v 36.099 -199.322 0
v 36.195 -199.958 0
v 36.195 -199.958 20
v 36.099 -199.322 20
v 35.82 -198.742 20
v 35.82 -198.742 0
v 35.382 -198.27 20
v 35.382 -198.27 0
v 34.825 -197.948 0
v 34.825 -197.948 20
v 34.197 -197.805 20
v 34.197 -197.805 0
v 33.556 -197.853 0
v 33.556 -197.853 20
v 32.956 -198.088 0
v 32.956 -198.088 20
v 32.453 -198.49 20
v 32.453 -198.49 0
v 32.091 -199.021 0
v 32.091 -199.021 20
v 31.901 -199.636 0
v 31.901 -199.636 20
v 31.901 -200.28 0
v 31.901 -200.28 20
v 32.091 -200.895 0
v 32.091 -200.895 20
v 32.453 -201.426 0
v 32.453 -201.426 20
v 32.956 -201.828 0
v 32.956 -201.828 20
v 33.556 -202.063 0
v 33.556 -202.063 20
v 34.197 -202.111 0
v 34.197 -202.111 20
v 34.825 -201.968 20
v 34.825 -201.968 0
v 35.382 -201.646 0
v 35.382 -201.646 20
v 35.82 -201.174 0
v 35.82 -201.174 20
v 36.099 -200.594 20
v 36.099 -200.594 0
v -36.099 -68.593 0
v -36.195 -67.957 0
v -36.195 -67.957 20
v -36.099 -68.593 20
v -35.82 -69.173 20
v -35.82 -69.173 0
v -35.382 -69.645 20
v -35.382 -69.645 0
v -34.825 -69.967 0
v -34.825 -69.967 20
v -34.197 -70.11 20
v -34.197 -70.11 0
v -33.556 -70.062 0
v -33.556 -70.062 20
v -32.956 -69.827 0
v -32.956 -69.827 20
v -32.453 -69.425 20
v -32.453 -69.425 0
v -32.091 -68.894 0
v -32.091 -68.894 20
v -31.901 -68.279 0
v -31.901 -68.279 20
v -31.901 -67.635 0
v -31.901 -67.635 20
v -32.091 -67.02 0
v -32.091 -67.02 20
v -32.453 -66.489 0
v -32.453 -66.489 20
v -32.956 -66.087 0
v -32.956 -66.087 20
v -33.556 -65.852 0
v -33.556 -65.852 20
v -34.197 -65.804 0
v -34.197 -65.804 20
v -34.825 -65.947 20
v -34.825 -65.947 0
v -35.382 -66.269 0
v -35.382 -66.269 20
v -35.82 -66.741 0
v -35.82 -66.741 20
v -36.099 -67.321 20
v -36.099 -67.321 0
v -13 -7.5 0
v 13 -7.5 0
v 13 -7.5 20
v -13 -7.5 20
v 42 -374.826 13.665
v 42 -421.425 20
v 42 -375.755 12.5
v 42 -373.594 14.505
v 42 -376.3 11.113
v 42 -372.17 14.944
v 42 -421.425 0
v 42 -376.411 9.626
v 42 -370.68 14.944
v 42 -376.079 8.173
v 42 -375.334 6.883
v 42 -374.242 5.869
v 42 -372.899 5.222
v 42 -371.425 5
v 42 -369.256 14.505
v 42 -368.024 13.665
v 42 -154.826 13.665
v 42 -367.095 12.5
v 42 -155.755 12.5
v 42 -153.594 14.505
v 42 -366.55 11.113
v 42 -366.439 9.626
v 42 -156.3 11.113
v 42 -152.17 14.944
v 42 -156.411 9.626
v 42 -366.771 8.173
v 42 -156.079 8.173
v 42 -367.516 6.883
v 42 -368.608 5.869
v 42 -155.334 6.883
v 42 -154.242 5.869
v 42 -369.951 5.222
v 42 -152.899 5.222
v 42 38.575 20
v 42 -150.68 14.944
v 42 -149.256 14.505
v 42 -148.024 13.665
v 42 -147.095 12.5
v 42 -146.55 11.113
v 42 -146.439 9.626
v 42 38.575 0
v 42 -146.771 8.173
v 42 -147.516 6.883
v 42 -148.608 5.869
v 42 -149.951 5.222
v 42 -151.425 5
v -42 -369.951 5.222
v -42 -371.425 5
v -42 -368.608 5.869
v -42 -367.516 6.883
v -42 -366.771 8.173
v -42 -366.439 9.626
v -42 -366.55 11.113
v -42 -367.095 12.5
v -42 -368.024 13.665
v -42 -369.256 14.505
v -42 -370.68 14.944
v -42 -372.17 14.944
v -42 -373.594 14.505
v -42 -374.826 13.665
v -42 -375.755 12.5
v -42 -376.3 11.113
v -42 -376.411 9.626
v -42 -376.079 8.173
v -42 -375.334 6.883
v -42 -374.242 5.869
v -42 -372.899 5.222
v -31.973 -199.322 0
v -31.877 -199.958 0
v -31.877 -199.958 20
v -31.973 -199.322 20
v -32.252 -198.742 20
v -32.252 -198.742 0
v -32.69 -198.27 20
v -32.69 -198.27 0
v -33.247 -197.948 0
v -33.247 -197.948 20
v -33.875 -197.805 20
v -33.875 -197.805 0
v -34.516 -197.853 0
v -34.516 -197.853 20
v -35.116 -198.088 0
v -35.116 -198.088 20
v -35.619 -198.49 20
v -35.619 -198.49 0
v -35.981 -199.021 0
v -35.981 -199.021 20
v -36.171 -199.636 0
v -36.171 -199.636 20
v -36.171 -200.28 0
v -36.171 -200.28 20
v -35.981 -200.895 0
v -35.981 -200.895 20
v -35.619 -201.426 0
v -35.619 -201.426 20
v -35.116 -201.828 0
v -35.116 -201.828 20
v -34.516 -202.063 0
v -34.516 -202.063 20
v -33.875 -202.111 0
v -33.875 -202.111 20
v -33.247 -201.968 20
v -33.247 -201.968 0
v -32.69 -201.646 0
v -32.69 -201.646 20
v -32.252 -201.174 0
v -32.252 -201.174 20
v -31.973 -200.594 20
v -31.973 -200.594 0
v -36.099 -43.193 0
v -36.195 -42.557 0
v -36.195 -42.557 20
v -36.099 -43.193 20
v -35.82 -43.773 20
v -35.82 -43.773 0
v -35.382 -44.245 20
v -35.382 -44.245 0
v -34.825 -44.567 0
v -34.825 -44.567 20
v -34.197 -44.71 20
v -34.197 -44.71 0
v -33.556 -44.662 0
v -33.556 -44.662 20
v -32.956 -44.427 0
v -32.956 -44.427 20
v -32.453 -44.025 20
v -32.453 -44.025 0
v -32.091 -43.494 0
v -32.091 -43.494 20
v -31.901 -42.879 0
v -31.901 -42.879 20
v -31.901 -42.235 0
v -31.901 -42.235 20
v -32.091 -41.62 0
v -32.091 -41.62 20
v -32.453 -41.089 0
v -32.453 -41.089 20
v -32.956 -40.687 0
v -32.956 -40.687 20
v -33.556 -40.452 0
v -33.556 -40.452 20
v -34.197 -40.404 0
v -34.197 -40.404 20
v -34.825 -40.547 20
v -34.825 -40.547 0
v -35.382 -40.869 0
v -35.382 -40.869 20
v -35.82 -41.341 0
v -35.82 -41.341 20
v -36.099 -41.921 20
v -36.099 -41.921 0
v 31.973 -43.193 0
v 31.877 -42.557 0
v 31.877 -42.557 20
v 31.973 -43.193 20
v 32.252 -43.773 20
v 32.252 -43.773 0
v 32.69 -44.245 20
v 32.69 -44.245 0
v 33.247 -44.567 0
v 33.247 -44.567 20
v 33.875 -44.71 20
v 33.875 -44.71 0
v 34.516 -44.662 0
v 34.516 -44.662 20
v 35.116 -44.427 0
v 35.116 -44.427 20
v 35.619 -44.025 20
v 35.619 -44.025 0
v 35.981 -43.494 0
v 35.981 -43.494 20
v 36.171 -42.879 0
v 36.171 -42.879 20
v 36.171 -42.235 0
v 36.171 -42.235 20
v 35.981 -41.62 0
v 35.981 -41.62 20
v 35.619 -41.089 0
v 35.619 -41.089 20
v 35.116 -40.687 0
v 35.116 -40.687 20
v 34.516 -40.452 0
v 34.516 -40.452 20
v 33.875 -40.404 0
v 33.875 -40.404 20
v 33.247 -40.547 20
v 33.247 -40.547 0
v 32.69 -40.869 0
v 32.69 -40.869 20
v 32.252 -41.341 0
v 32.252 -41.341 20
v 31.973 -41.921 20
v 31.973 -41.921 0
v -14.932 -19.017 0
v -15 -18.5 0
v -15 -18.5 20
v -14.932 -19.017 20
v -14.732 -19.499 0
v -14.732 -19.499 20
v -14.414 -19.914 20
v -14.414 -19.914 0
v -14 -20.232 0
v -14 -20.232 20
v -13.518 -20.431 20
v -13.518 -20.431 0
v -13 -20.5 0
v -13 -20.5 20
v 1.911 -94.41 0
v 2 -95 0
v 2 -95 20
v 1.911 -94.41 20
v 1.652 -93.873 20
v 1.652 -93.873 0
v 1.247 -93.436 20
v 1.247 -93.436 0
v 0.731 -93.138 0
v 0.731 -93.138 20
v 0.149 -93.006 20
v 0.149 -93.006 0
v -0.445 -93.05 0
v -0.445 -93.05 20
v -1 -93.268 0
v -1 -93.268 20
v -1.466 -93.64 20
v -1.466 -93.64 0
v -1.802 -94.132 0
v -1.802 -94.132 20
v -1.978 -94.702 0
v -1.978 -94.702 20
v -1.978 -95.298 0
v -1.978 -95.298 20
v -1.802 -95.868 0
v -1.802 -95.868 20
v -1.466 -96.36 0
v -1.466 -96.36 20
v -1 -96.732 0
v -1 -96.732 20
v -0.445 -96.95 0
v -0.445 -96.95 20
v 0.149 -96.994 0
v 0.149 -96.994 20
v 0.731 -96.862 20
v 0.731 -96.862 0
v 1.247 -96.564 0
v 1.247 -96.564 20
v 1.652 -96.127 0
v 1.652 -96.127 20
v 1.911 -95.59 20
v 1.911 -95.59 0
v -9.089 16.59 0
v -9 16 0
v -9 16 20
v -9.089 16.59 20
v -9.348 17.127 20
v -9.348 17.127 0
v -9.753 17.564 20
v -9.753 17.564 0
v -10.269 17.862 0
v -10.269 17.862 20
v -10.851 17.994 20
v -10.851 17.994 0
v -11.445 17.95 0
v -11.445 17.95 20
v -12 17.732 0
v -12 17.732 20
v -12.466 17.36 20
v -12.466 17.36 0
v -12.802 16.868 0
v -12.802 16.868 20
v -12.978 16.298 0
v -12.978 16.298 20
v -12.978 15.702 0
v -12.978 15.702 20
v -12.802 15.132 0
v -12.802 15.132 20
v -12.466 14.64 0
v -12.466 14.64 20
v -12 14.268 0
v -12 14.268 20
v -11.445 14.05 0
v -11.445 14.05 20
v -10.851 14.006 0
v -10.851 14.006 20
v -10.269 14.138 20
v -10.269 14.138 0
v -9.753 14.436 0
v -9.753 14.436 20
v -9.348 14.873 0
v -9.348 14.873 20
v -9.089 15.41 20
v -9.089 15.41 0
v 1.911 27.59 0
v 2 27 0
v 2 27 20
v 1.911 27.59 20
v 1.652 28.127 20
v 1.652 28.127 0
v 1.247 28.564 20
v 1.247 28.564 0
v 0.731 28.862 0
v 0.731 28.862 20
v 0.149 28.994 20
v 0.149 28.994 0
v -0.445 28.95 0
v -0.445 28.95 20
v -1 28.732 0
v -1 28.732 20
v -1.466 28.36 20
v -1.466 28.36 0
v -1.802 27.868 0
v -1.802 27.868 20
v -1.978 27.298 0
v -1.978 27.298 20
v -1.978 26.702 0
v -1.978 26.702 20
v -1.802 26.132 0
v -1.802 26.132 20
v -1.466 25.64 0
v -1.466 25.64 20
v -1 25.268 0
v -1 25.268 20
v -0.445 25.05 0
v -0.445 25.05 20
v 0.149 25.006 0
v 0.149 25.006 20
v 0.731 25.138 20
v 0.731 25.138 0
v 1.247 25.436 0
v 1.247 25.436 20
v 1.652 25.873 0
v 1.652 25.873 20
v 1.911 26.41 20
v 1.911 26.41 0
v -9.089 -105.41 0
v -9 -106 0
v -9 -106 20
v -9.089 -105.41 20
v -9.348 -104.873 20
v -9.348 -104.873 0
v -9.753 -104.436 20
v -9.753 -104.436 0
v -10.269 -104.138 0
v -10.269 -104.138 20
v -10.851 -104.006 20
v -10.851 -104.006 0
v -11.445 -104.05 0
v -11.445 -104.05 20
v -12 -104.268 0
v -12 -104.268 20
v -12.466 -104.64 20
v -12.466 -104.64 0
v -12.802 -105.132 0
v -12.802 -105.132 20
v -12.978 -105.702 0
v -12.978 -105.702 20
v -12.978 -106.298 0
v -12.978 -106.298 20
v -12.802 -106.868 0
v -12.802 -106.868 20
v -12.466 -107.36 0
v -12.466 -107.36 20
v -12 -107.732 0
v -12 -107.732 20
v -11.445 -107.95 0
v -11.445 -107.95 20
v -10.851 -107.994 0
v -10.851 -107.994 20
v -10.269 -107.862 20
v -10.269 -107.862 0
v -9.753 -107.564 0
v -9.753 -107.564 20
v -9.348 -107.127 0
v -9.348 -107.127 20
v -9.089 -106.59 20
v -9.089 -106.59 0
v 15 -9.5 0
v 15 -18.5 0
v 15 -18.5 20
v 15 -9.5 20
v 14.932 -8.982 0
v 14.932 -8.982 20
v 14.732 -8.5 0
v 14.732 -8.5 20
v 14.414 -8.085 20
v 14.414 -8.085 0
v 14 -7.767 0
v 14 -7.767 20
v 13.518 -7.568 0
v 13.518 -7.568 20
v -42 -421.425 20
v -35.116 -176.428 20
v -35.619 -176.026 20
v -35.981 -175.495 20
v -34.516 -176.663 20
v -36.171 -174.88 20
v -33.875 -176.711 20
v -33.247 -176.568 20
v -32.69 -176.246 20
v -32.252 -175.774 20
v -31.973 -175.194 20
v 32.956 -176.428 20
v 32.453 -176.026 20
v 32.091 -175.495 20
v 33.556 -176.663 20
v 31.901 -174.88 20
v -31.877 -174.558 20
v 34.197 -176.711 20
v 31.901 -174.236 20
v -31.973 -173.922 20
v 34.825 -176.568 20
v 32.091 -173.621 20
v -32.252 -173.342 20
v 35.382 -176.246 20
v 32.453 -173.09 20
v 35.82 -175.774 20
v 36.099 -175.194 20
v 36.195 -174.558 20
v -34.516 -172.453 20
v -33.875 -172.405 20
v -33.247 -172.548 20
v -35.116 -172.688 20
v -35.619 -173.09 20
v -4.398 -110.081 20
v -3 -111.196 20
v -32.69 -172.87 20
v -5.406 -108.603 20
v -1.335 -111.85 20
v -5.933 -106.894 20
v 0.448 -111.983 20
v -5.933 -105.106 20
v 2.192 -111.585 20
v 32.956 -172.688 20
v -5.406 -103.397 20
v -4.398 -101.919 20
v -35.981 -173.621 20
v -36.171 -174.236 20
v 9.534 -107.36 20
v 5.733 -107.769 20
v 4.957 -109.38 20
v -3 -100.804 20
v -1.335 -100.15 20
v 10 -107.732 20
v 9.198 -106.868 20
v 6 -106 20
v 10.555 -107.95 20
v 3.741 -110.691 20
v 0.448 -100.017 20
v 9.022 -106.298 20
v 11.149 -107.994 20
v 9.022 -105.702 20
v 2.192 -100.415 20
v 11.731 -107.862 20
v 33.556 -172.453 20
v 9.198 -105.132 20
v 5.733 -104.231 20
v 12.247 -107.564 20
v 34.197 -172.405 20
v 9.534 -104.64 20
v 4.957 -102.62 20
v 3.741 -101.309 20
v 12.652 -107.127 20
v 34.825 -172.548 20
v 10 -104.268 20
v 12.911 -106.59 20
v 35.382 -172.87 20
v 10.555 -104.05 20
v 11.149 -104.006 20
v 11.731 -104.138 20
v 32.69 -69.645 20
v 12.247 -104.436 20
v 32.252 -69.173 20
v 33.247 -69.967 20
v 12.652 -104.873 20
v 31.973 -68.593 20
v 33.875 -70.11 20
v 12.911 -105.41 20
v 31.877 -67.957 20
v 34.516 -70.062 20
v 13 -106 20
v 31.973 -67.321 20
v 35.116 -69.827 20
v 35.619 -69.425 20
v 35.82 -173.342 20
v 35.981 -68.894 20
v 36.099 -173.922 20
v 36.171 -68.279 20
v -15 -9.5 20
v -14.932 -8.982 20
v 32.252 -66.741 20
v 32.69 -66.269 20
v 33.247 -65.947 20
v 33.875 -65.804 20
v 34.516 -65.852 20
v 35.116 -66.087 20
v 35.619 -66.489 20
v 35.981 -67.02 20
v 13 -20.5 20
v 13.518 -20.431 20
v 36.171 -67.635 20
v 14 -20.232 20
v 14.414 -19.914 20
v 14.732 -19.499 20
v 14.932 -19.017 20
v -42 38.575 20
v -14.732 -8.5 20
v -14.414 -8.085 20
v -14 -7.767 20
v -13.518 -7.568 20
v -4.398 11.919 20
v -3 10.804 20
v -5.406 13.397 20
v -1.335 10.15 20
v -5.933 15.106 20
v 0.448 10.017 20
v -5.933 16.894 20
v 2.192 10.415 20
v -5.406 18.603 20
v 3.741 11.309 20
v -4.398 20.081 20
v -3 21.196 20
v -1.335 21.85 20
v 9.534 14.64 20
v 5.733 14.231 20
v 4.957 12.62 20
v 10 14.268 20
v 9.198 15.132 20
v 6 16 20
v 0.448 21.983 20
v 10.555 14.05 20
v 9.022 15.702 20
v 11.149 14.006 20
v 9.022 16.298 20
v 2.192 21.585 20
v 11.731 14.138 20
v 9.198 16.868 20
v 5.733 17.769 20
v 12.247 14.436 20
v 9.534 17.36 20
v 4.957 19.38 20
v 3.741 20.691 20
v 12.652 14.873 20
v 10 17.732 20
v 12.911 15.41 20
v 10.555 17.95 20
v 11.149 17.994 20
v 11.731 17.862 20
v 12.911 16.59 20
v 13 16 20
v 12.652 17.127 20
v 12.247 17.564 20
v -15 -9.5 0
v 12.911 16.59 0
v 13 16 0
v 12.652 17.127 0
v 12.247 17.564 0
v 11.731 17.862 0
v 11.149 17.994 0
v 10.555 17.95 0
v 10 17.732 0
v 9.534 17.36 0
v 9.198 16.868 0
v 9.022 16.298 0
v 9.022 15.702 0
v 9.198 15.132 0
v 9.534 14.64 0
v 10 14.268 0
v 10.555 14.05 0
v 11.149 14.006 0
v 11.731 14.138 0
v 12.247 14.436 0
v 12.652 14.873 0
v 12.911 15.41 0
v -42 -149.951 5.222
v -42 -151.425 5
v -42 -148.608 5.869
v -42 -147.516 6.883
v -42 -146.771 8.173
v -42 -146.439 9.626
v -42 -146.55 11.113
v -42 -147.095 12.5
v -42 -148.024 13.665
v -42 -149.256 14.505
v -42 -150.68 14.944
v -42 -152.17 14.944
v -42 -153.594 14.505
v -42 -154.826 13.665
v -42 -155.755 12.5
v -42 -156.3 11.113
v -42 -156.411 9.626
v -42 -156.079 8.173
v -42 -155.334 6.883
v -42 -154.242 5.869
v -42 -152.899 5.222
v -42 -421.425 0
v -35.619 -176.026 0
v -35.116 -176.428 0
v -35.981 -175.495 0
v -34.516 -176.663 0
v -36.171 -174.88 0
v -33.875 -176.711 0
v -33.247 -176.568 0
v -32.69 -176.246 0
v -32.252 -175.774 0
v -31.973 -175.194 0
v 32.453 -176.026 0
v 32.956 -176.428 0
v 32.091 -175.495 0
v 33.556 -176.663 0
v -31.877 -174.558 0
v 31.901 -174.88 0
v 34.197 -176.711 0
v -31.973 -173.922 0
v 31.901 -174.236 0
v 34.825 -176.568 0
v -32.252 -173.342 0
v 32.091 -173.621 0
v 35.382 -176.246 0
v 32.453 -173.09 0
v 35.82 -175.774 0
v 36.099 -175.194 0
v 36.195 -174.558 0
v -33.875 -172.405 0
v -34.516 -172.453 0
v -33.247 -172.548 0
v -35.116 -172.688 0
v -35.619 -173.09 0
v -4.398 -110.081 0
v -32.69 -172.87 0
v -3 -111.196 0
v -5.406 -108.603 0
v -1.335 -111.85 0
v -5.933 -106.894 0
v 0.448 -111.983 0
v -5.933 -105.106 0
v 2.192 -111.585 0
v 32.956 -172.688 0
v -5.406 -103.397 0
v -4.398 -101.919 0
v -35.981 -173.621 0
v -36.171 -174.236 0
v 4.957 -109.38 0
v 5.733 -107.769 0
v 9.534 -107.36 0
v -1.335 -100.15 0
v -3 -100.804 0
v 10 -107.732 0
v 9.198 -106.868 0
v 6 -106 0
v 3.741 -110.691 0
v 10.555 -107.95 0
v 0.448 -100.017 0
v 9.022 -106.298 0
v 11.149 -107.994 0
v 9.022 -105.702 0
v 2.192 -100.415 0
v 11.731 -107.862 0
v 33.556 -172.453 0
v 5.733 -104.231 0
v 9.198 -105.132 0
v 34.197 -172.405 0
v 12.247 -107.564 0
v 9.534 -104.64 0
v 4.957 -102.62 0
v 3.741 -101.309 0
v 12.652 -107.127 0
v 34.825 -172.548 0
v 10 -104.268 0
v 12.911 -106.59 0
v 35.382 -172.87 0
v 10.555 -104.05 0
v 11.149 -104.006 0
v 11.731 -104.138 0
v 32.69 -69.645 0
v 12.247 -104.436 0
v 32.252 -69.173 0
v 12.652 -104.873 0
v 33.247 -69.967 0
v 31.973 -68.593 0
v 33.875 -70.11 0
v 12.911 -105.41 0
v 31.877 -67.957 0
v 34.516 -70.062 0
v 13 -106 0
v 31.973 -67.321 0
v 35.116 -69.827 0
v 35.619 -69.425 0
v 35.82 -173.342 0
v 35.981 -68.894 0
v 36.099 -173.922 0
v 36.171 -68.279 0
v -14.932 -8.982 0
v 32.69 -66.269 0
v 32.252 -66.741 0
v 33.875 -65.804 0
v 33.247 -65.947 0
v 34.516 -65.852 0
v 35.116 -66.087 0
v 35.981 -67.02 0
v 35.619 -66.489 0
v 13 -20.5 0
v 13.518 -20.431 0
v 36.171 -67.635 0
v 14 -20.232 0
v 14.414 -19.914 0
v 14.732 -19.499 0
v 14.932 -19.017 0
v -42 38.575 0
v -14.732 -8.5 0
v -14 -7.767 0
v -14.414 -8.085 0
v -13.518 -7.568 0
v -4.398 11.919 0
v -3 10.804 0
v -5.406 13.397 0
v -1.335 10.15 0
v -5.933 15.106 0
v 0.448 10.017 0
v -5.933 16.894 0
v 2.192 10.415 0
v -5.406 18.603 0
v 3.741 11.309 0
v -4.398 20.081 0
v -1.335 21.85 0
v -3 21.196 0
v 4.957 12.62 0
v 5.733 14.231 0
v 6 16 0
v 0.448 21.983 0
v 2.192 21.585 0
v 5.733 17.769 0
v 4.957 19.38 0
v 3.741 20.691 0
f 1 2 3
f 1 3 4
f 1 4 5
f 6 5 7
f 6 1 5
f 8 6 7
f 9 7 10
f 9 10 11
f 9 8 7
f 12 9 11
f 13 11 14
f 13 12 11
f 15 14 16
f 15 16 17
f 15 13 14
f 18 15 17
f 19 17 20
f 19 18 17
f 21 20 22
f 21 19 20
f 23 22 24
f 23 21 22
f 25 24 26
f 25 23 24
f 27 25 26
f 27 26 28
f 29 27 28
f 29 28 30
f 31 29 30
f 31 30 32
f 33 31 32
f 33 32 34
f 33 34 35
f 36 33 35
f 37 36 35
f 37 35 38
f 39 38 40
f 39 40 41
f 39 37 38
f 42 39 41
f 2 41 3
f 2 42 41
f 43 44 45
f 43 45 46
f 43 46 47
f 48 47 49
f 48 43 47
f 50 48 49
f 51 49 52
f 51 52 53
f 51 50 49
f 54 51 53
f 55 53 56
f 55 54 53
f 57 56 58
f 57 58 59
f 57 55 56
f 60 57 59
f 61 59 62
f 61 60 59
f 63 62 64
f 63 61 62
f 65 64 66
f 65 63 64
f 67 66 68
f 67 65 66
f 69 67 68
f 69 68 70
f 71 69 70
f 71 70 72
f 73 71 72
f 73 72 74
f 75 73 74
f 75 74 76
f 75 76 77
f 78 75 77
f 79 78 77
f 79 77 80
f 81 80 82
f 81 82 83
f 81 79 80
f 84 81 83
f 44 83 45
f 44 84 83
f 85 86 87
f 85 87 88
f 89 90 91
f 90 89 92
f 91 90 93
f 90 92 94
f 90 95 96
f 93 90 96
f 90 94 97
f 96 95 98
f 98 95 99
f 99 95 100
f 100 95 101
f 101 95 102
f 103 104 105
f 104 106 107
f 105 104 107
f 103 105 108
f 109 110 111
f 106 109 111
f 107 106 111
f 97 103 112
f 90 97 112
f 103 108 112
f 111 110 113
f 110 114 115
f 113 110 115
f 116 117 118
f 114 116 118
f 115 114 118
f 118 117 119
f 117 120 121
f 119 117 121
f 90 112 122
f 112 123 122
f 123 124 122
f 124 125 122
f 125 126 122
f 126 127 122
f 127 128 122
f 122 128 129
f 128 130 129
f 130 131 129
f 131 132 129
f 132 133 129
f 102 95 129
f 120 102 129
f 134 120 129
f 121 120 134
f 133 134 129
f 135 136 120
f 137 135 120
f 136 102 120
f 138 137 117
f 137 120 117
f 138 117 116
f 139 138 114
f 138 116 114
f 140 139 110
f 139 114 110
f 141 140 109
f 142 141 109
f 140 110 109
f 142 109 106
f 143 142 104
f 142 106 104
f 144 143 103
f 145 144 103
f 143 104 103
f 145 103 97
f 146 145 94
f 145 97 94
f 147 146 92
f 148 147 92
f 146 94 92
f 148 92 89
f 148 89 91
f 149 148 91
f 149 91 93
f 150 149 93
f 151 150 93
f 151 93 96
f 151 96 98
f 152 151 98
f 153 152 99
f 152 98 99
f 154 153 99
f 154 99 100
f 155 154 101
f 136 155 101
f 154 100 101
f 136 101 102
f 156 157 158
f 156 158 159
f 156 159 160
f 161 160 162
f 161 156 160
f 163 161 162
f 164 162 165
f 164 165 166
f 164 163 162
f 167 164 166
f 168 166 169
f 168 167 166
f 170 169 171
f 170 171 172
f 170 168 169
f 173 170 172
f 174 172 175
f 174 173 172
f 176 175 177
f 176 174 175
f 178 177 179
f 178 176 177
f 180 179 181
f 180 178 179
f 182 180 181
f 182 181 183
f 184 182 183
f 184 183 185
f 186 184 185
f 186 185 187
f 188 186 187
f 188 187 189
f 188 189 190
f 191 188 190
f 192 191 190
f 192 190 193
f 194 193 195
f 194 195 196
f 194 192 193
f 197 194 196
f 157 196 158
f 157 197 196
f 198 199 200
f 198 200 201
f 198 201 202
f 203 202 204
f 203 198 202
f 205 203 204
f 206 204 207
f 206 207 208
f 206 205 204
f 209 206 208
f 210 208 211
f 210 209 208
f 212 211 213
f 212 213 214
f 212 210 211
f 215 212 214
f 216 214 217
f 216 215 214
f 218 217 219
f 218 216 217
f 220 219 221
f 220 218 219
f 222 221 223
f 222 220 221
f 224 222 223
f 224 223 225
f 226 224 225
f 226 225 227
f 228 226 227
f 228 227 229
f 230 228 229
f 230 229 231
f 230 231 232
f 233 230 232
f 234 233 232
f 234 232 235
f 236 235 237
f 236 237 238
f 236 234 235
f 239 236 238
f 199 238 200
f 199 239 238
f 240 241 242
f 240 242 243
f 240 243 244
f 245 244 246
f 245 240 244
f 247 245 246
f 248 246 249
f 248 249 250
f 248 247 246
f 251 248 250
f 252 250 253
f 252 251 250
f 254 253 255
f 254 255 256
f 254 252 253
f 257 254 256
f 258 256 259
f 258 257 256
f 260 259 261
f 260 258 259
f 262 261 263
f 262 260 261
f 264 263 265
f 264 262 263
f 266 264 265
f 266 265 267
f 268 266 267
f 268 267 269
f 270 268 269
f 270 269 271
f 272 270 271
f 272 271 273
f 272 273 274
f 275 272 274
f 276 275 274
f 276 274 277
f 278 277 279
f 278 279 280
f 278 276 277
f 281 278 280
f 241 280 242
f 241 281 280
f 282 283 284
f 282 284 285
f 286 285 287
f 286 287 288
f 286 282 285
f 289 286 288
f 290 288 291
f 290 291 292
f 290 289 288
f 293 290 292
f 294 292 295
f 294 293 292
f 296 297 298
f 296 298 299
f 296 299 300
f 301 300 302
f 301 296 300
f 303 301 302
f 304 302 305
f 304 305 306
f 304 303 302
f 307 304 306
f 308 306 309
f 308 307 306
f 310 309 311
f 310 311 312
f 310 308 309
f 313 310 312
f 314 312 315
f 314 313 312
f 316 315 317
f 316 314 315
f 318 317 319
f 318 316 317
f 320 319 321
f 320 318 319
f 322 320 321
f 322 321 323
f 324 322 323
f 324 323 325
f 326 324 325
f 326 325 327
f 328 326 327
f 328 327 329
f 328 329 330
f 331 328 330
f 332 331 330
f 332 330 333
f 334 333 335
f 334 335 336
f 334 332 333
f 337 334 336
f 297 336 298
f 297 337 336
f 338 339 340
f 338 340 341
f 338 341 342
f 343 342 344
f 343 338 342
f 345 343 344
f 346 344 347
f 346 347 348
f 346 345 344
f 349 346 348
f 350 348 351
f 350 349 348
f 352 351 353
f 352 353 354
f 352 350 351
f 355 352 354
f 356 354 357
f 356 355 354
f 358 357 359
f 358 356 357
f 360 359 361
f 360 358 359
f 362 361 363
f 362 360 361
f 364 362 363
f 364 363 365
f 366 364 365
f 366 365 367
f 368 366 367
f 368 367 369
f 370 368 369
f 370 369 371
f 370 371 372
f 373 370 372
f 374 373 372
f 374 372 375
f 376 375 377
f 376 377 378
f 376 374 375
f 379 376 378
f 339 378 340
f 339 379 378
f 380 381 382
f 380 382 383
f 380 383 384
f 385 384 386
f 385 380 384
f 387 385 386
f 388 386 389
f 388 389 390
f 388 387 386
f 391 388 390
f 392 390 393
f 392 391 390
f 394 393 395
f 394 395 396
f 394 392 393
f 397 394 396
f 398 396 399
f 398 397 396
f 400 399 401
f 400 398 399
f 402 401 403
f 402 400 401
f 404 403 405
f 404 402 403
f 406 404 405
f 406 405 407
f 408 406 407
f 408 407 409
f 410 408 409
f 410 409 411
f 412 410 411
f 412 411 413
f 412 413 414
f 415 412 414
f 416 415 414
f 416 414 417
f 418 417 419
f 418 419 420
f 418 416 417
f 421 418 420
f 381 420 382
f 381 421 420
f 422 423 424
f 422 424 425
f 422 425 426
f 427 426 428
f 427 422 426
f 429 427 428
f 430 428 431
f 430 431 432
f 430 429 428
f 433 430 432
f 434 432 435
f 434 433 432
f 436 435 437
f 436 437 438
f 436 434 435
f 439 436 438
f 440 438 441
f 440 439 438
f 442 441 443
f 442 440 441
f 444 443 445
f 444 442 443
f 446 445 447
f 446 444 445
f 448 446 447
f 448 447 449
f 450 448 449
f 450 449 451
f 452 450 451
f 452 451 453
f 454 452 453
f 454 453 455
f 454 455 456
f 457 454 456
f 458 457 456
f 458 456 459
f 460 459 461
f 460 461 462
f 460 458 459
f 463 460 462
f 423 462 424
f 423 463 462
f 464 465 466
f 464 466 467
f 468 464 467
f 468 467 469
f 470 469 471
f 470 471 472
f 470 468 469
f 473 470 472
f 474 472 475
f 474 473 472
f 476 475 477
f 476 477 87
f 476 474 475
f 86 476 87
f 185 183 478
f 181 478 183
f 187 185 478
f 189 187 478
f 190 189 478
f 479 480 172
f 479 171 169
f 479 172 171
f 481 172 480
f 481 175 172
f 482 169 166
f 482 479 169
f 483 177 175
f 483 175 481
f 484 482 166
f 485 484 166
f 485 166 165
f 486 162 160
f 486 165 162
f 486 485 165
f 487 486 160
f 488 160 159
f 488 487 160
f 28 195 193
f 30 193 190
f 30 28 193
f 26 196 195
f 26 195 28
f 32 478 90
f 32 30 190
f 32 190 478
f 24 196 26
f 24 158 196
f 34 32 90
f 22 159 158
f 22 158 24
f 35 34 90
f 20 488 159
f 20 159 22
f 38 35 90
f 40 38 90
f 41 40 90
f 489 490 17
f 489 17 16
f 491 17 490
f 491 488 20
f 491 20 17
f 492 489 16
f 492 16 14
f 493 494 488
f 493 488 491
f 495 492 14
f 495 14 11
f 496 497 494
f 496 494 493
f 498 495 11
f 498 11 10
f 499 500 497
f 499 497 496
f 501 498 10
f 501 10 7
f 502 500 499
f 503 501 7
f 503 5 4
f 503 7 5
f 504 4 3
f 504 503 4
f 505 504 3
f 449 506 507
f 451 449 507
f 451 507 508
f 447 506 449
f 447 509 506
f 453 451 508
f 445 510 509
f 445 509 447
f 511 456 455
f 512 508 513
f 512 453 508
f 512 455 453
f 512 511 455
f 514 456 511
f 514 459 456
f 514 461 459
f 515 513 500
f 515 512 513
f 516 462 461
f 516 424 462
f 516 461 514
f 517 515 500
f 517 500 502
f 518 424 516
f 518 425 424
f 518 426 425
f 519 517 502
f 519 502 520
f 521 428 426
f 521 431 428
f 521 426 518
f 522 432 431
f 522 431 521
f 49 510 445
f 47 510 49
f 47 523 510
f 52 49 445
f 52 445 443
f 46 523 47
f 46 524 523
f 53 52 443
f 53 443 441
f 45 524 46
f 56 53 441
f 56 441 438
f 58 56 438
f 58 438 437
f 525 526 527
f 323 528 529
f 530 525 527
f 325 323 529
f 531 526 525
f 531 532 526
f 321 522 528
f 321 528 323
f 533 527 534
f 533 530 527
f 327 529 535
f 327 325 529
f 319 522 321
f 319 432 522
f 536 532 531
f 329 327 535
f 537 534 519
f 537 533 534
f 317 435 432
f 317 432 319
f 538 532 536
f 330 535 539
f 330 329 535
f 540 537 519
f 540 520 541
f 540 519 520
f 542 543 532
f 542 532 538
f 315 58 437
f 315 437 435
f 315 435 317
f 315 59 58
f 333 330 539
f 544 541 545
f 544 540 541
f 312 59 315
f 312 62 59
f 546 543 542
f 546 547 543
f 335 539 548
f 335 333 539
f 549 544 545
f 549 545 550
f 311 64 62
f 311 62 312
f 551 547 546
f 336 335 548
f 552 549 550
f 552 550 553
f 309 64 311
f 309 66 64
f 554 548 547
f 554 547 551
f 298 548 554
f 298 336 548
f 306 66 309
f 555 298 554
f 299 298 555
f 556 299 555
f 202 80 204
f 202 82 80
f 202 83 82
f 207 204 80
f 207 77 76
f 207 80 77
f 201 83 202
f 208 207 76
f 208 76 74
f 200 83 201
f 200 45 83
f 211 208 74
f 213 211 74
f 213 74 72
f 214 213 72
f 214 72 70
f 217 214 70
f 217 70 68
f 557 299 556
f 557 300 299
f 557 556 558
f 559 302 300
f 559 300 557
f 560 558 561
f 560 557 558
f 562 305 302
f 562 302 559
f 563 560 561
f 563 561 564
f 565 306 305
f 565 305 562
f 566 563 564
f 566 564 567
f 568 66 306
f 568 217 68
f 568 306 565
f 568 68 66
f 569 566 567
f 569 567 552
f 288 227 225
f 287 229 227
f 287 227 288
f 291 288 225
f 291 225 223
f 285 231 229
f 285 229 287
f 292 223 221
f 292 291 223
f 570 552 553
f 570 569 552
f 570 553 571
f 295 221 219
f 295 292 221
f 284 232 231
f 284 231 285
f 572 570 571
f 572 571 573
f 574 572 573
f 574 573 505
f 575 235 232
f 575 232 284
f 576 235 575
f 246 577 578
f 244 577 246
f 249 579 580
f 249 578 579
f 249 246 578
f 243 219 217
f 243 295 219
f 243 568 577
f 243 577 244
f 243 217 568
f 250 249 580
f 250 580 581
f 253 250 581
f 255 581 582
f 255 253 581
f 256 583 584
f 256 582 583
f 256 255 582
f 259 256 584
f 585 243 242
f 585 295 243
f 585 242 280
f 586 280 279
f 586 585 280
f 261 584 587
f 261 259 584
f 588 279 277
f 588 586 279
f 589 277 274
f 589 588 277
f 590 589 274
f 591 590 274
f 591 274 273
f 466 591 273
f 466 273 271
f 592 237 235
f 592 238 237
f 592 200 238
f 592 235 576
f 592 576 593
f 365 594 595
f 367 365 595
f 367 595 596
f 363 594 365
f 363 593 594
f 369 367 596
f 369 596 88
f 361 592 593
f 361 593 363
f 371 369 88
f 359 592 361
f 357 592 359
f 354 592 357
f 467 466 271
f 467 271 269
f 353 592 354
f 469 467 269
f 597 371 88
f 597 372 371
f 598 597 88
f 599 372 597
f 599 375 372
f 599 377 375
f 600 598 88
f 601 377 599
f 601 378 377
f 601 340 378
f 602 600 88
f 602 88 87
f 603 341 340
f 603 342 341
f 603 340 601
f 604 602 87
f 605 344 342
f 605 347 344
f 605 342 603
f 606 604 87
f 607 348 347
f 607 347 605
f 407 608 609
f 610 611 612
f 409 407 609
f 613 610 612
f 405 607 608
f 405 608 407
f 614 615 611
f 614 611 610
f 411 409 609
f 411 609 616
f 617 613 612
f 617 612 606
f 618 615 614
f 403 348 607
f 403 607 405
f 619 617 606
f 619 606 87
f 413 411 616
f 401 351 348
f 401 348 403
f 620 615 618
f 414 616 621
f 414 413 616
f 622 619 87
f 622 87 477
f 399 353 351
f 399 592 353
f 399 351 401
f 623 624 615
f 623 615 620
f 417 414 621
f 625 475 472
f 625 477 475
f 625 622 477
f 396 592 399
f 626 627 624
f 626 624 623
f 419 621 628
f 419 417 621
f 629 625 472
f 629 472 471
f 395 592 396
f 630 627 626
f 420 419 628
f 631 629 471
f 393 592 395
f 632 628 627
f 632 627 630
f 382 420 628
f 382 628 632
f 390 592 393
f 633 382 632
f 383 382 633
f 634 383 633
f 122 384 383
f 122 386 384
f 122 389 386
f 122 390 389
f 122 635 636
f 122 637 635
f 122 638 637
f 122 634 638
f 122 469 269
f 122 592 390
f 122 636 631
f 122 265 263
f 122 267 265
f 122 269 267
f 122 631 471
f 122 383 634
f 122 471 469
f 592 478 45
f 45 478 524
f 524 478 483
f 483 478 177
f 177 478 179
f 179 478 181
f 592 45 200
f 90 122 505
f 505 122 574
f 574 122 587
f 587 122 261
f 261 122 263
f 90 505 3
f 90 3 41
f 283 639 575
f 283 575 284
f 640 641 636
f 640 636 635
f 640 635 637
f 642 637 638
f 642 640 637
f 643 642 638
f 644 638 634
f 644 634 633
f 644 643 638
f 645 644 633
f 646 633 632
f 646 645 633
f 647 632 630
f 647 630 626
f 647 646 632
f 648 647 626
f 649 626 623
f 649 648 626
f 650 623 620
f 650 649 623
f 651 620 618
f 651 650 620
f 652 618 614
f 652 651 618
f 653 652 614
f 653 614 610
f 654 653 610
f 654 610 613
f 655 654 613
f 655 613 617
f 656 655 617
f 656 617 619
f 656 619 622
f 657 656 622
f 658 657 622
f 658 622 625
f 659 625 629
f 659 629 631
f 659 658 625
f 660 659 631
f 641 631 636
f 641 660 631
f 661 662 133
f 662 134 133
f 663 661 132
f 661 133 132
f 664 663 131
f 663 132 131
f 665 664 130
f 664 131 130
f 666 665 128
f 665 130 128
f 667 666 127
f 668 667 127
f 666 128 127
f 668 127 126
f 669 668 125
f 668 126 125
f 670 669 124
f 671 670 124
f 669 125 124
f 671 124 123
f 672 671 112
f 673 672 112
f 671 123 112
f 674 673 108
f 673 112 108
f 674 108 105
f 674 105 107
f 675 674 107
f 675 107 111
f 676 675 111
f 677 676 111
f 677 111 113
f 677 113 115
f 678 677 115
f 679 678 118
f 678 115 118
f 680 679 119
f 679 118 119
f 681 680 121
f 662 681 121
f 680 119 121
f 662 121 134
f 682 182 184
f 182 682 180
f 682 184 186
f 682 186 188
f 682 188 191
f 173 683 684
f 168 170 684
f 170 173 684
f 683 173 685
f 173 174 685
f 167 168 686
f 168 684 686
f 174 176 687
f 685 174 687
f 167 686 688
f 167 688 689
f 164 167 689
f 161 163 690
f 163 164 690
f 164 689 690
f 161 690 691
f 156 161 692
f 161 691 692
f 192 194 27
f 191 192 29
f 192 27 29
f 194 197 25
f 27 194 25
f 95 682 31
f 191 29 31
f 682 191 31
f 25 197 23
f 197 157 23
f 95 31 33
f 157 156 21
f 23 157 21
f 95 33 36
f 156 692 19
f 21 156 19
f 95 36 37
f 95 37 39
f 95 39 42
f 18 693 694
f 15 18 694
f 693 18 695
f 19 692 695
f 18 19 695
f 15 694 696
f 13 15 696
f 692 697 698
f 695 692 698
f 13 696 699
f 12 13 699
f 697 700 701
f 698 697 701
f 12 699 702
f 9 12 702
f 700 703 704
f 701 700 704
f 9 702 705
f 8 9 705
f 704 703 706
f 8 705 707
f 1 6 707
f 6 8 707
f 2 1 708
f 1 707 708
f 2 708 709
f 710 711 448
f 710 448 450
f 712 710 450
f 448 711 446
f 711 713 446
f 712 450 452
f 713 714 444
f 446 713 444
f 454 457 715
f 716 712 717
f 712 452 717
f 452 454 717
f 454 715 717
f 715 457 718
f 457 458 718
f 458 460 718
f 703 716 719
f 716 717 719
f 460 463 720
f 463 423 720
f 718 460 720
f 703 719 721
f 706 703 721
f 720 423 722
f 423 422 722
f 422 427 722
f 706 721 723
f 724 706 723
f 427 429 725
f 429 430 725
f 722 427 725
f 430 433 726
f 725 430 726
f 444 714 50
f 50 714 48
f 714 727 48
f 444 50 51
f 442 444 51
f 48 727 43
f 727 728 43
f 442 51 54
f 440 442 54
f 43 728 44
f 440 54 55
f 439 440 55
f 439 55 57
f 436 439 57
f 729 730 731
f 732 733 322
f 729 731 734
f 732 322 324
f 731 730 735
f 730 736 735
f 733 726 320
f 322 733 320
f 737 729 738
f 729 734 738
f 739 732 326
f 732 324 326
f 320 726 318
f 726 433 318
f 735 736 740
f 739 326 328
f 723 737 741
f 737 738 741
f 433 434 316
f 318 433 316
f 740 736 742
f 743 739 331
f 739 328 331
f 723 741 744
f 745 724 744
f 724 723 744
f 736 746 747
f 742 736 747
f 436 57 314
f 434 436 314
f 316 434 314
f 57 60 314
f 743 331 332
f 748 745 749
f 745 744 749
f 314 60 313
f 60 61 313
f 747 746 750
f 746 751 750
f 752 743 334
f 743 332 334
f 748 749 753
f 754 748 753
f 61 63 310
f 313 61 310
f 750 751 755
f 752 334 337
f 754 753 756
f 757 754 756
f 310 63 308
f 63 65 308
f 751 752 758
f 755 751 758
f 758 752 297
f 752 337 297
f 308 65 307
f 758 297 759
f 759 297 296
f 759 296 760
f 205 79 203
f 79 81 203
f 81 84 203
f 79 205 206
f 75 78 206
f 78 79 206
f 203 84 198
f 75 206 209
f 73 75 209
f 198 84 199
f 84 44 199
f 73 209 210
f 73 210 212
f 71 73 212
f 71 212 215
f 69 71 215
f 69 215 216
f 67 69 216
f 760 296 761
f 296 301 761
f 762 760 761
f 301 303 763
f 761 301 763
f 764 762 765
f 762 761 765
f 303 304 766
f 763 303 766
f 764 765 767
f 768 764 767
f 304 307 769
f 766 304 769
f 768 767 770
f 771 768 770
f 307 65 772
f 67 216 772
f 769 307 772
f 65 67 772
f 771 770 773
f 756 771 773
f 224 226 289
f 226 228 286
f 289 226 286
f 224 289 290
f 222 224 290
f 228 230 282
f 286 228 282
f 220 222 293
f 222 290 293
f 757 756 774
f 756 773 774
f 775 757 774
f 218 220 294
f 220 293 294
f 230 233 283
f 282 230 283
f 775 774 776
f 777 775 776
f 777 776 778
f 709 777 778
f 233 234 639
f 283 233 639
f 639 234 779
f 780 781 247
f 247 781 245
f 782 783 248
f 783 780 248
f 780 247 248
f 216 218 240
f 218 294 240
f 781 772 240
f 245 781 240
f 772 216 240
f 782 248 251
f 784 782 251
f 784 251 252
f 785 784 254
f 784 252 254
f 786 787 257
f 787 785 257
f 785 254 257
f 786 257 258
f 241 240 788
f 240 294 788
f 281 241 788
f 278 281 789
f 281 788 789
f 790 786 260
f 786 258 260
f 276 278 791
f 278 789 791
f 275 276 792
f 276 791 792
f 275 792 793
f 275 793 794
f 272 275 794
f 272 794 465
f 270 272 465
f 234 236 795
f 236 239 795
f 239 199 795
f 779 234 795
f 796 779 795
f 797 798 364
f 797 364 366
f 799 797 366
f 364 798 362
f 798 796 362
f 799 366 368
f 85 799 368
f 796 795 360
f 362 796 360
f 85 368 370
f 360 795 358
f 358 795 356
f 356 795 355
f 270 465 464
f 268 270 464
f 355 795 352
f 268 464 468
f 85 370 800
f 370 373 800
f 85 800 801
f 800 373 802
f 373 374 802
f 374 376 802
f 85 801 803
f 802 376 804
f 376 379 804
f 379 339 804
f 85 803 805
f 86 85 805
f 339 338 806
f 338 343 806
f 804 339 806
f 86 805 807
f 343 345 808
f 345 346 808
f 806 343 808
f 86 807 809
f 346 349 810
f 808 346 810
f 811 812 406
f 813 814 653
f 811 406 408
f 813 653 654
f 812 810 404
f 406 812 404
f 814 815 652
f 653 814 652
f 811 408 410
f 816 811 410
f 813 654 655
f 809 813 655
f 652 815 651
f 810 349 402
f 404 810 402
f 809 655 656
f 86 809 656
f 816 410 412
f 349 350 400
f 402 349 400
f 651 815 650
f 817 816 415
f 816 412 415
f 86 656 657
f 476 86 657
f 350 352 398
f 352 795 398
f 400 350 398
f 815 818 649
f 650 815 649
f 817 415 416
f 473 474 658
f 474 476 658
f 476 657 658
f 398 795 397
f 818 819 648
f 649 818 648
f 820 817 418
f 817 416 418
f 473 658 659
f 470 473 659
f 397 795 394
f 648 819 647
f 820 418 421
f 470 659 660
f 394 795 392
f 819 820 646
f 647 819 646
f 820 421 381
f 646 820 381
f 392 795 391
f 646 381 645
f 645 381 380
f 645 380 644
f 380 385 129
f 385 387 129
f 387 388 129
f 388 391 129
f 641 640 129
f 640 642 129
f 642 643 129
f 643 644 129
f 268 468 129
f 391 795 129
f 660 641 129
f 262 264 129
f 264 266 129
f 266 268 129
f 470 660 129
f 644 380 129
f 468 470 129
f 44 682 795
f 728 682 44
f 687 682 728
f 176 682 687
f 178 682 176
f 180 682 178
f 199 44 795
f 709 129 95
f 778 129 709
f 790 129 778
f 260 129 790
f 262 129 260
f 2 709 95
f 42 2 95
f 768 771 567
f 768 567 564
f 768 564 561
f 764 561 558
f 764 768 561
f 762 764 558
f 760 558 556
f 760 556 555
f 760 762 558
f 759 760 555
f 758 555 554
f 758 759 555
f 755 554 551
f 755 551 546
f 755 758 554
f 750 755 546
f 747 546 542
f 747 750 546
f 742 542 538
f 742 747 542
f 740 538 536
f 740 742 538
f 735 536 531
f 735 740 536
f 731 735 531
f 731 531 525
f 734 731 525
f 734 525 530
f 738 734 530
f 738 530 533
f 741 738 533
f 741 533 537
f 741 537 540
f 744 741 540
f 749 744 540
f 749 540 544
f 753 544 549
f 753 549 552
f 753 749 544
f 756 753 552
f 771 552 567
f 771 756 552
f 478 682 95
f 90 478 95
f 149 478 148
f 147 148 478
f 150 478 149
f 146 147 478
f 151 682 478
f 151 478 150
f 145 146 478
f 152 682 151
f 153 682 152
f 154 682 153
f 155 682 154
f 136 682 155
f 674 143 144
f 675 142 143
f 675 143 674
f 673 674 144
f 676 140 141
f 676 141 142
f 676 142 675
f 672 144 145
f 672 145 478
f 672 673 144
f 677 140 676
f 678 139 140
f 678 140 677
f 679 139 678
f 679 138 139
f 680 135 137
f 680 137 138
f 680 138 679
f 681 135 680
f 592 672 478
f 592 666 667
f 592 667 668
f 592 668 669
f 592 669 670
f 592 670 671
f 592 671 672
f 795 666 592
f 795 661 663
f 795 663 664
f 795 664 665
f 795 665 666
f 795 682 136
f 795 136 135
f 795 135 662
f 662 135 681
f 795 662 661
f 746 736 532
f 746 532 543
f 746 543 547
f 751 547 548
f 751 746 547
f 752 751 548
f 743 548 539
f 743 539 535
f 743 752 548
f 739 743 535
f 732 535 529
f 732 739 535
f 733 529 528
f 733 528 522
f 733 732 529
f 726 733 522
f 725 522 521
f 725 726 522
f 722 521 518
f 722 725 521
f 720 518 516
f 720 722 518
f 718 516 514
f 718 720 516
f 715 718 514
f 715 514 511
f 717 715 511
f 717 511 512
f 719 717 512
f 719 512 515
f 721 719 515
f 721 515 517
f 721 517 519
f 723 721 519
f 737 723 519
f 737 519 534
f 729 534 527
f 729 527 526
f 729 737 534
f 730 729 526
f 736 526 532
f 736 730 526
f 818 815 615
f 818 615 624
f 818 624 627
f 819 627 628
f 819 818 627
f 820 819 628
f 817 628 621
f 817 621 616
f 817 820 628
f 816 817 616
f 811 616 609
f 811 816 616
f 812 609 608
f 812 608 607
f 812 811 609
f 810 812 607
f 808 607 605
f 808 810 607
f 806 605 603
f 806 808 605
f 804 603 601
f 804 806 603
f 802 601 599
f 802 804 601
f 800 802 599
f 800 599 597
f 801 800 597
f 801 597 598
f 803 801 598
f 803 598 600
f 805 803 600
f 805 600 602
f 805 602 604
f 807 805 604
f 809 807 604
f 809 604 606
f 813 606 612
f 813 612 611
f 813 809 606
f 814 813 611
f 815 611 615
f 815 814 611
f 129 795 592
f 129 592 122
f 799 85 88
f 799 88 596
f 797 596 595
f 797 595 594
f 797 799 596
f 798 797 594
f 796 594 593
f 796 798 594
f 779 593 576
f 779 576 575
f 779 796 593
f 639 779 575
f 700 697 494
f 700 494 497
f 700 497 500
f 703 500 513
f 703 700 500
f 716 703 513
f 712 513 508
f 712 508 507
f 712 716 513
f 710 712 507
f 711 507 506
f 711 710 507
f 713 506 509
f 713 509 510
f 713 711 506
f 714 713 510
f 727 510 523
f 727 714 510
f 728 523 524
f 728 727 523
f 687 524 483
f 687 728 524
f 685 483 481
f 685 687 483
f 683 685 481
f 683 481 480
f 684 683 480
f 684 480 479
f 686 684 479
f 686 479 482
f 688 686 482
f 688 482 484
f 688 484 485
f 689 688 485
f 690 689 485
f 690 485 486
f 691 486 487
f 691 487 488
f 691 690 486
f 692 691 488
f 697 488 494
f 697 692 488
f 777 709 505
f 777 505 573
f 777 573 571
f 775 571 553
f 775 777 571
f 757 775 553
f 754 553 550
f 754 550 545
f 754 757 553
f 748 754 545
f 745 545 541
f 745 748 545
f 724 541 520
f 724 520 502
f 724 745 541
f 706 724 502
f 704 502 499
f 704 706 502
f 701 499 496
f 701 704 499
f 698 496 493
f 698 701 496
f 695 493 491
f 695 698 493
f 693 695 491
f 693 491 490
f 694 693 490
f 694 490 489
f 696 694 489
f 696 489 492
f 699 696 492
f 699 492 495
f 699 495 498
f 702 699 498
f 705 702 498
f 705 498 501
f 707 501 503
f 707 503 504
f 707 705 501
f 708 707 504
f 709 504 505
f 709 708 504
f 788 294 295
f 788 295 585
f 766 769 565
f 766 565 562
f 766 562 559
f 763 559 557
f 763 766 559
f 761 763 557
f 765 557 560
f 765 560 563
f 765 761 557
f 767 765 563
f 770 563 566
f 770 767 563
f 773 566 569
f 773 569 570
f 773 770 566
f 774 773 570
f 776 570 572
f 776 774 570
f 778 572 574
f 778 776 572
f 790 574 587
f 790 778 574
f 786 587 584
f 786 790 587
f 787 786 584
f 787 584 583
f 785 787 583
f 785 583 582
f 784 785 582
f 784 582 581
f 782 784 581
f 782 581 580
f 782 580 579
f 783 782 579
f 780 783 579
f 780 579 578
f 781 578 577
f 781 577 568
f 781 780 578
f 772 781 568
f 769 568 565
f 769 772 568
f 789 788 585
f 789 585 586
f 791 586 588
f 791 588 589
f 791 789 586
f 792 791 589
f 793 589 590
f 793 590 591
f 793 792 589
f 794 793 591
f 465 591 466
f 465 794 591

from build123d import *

# Parameters (mm, degrees)
SKETCH1_W           = 84
SKETCH1_H           = 460
SKETCH1_R           = 6
SKETCH1_R_2         = 2
BOSS_EXTRUDE1_DEPTH = 20
SKETCH2_R           = 5
CUT_EXTRUDE1_DEPTH  = 50
SKETCH4_R           = 2.159
CUT_EXTRUDE2_DEPTH  = 20
CUT_EXTRUDE3_DEPTH  = 20
SKETCH6_R           = 2.159
CUT_EXTRUDE4_DEPTH  = 20


with BuildPart() as part:
    # Sketch1 → Boss-Extrude1 (new body)
    with BuildSketch(Plane.XY):
        with Locations((0, -191.425)):
            Rectangle(SKETCH1_W, SKETCH1_H)
        with Locations((0, -106)):
            Circle(SKETCH1_R, mode=Mode.SUBTRACT)
        with Locations((11, -106)):
            Circle(SKETCH1_R_2, mode=Mode.SUBTRACT)
        with Locations((0, -95)):
            Circle(SKETCH1_R_2, mode=Mode.SUBTRACT)
        with Locations((0, 16)):
            Circle(SKETCH1_R, mode=Mode.SUBTRACT)
        with Locations((11, 16)):
            Circle(SKETCH1_R_2, mode=Mode.SUBTRACT)
        with Locations((-11, -106)):
            Circle(SKETCH1_R_2, mode=Mode.SUBTRACT)
        with Locations((0, 27)):
            Circle(SKETCH1_R_2, mode=Mode.SUBTRACT)
        with Locations((-11, 16)):
            Circle(SKETCH1_R_2, mode=Mode.SUBTRACT)
    extrude(amount=BOSS_EXTRUDE1_DEPTH)

    # Sketch2 → Cut-Extrude1 (cut, symmetric)
    with BuildSketch(Plane(origin=(0, 0, 0), x_dir=(0, 0, -1), z_dir=(1, 0, 0))):
        with Locations((-10, -151.425)):
            Circle(SKETCH2_R)
        with Locations((-10, -371.425)):
            Circle(SKETCH2_R)
    extrude(amount=CUT_EXTRUDE1_DEPTH, both=True, mode=Mode.SUBTRACT)

    # Sketch4 → Cut-Extrude2 (cut)
    with BuildSketch(Plane.XY):
        with Locations(Location((34.036, -42.557, 0), (0, 0, 180))):
            Circle(SKETCH4_R)
        with Locations(Location((34.036, -67.957, 0), (0, 0, 180))):
            Circle(SKETCH4_R)
        with Locations(Location((-34.036, -67.957, 0), (0, 0, 180))):
            Circle(SKETCH4_R)
        with Locations(Location((-34.036, -42.557, 0), (0, 0, 180))):
            Circle(SKETCH4_R)
    extrude(amount=CUT_EXTRUDE2_DEPTH, mode=Mode.SUBTRACT)

    # Sketch5 → Cut-Extrude3 (cut)
    with BuildSketch(Plane.XY):
        with BuildLine():
            Line((15, -18.4995), (15, -9.4995))
            ThreePointArc((15, -9.4995), (14.414213562, -8.085286438), (13, -7.4995))
            Line((13, -7.4995), (-13, -7.4995))
            ThreePointArc((-13, -7.4995), (-14.414213562, -8.085286438), (-15, -9.4995))
            Line((-15, -9.4995), (-15, -18.4995))
            ThreePointArc((-15, -18.4995), (-14.414213562, -19.913713562), (-13, -20.4995))
            Line((-13, -20.4995), (13, -20.4995))
            ThreePointArc((13, -20.4995), (14.414213562, -19.913713562), (15, -18.4995))
        make_face()
    extrude(amount=CUT_EXTRUDE3_DEPTH, mode=Mode.SUBTRACT)

    # Sketch6 → Cut-Extrude4 (cut)
    with BuildSketch(Plane.XY):
        with Locations((34.036, -174.558)):
            Circle(SKETCH6_R)
        with Locations((-34.036, -174.558)):
            Circle(SKETCH6_R)
        with Locations((-34.036, -199.958)):
            Circle(SKETCH6_R)
        with Locations((34.036, -199.958)):
            Circle(SKETCH6_R)
    extrude(amount=CUT_EXTRUDE4_DEPTH, mode=Mode.SUBTRACT)


solid = part.part
